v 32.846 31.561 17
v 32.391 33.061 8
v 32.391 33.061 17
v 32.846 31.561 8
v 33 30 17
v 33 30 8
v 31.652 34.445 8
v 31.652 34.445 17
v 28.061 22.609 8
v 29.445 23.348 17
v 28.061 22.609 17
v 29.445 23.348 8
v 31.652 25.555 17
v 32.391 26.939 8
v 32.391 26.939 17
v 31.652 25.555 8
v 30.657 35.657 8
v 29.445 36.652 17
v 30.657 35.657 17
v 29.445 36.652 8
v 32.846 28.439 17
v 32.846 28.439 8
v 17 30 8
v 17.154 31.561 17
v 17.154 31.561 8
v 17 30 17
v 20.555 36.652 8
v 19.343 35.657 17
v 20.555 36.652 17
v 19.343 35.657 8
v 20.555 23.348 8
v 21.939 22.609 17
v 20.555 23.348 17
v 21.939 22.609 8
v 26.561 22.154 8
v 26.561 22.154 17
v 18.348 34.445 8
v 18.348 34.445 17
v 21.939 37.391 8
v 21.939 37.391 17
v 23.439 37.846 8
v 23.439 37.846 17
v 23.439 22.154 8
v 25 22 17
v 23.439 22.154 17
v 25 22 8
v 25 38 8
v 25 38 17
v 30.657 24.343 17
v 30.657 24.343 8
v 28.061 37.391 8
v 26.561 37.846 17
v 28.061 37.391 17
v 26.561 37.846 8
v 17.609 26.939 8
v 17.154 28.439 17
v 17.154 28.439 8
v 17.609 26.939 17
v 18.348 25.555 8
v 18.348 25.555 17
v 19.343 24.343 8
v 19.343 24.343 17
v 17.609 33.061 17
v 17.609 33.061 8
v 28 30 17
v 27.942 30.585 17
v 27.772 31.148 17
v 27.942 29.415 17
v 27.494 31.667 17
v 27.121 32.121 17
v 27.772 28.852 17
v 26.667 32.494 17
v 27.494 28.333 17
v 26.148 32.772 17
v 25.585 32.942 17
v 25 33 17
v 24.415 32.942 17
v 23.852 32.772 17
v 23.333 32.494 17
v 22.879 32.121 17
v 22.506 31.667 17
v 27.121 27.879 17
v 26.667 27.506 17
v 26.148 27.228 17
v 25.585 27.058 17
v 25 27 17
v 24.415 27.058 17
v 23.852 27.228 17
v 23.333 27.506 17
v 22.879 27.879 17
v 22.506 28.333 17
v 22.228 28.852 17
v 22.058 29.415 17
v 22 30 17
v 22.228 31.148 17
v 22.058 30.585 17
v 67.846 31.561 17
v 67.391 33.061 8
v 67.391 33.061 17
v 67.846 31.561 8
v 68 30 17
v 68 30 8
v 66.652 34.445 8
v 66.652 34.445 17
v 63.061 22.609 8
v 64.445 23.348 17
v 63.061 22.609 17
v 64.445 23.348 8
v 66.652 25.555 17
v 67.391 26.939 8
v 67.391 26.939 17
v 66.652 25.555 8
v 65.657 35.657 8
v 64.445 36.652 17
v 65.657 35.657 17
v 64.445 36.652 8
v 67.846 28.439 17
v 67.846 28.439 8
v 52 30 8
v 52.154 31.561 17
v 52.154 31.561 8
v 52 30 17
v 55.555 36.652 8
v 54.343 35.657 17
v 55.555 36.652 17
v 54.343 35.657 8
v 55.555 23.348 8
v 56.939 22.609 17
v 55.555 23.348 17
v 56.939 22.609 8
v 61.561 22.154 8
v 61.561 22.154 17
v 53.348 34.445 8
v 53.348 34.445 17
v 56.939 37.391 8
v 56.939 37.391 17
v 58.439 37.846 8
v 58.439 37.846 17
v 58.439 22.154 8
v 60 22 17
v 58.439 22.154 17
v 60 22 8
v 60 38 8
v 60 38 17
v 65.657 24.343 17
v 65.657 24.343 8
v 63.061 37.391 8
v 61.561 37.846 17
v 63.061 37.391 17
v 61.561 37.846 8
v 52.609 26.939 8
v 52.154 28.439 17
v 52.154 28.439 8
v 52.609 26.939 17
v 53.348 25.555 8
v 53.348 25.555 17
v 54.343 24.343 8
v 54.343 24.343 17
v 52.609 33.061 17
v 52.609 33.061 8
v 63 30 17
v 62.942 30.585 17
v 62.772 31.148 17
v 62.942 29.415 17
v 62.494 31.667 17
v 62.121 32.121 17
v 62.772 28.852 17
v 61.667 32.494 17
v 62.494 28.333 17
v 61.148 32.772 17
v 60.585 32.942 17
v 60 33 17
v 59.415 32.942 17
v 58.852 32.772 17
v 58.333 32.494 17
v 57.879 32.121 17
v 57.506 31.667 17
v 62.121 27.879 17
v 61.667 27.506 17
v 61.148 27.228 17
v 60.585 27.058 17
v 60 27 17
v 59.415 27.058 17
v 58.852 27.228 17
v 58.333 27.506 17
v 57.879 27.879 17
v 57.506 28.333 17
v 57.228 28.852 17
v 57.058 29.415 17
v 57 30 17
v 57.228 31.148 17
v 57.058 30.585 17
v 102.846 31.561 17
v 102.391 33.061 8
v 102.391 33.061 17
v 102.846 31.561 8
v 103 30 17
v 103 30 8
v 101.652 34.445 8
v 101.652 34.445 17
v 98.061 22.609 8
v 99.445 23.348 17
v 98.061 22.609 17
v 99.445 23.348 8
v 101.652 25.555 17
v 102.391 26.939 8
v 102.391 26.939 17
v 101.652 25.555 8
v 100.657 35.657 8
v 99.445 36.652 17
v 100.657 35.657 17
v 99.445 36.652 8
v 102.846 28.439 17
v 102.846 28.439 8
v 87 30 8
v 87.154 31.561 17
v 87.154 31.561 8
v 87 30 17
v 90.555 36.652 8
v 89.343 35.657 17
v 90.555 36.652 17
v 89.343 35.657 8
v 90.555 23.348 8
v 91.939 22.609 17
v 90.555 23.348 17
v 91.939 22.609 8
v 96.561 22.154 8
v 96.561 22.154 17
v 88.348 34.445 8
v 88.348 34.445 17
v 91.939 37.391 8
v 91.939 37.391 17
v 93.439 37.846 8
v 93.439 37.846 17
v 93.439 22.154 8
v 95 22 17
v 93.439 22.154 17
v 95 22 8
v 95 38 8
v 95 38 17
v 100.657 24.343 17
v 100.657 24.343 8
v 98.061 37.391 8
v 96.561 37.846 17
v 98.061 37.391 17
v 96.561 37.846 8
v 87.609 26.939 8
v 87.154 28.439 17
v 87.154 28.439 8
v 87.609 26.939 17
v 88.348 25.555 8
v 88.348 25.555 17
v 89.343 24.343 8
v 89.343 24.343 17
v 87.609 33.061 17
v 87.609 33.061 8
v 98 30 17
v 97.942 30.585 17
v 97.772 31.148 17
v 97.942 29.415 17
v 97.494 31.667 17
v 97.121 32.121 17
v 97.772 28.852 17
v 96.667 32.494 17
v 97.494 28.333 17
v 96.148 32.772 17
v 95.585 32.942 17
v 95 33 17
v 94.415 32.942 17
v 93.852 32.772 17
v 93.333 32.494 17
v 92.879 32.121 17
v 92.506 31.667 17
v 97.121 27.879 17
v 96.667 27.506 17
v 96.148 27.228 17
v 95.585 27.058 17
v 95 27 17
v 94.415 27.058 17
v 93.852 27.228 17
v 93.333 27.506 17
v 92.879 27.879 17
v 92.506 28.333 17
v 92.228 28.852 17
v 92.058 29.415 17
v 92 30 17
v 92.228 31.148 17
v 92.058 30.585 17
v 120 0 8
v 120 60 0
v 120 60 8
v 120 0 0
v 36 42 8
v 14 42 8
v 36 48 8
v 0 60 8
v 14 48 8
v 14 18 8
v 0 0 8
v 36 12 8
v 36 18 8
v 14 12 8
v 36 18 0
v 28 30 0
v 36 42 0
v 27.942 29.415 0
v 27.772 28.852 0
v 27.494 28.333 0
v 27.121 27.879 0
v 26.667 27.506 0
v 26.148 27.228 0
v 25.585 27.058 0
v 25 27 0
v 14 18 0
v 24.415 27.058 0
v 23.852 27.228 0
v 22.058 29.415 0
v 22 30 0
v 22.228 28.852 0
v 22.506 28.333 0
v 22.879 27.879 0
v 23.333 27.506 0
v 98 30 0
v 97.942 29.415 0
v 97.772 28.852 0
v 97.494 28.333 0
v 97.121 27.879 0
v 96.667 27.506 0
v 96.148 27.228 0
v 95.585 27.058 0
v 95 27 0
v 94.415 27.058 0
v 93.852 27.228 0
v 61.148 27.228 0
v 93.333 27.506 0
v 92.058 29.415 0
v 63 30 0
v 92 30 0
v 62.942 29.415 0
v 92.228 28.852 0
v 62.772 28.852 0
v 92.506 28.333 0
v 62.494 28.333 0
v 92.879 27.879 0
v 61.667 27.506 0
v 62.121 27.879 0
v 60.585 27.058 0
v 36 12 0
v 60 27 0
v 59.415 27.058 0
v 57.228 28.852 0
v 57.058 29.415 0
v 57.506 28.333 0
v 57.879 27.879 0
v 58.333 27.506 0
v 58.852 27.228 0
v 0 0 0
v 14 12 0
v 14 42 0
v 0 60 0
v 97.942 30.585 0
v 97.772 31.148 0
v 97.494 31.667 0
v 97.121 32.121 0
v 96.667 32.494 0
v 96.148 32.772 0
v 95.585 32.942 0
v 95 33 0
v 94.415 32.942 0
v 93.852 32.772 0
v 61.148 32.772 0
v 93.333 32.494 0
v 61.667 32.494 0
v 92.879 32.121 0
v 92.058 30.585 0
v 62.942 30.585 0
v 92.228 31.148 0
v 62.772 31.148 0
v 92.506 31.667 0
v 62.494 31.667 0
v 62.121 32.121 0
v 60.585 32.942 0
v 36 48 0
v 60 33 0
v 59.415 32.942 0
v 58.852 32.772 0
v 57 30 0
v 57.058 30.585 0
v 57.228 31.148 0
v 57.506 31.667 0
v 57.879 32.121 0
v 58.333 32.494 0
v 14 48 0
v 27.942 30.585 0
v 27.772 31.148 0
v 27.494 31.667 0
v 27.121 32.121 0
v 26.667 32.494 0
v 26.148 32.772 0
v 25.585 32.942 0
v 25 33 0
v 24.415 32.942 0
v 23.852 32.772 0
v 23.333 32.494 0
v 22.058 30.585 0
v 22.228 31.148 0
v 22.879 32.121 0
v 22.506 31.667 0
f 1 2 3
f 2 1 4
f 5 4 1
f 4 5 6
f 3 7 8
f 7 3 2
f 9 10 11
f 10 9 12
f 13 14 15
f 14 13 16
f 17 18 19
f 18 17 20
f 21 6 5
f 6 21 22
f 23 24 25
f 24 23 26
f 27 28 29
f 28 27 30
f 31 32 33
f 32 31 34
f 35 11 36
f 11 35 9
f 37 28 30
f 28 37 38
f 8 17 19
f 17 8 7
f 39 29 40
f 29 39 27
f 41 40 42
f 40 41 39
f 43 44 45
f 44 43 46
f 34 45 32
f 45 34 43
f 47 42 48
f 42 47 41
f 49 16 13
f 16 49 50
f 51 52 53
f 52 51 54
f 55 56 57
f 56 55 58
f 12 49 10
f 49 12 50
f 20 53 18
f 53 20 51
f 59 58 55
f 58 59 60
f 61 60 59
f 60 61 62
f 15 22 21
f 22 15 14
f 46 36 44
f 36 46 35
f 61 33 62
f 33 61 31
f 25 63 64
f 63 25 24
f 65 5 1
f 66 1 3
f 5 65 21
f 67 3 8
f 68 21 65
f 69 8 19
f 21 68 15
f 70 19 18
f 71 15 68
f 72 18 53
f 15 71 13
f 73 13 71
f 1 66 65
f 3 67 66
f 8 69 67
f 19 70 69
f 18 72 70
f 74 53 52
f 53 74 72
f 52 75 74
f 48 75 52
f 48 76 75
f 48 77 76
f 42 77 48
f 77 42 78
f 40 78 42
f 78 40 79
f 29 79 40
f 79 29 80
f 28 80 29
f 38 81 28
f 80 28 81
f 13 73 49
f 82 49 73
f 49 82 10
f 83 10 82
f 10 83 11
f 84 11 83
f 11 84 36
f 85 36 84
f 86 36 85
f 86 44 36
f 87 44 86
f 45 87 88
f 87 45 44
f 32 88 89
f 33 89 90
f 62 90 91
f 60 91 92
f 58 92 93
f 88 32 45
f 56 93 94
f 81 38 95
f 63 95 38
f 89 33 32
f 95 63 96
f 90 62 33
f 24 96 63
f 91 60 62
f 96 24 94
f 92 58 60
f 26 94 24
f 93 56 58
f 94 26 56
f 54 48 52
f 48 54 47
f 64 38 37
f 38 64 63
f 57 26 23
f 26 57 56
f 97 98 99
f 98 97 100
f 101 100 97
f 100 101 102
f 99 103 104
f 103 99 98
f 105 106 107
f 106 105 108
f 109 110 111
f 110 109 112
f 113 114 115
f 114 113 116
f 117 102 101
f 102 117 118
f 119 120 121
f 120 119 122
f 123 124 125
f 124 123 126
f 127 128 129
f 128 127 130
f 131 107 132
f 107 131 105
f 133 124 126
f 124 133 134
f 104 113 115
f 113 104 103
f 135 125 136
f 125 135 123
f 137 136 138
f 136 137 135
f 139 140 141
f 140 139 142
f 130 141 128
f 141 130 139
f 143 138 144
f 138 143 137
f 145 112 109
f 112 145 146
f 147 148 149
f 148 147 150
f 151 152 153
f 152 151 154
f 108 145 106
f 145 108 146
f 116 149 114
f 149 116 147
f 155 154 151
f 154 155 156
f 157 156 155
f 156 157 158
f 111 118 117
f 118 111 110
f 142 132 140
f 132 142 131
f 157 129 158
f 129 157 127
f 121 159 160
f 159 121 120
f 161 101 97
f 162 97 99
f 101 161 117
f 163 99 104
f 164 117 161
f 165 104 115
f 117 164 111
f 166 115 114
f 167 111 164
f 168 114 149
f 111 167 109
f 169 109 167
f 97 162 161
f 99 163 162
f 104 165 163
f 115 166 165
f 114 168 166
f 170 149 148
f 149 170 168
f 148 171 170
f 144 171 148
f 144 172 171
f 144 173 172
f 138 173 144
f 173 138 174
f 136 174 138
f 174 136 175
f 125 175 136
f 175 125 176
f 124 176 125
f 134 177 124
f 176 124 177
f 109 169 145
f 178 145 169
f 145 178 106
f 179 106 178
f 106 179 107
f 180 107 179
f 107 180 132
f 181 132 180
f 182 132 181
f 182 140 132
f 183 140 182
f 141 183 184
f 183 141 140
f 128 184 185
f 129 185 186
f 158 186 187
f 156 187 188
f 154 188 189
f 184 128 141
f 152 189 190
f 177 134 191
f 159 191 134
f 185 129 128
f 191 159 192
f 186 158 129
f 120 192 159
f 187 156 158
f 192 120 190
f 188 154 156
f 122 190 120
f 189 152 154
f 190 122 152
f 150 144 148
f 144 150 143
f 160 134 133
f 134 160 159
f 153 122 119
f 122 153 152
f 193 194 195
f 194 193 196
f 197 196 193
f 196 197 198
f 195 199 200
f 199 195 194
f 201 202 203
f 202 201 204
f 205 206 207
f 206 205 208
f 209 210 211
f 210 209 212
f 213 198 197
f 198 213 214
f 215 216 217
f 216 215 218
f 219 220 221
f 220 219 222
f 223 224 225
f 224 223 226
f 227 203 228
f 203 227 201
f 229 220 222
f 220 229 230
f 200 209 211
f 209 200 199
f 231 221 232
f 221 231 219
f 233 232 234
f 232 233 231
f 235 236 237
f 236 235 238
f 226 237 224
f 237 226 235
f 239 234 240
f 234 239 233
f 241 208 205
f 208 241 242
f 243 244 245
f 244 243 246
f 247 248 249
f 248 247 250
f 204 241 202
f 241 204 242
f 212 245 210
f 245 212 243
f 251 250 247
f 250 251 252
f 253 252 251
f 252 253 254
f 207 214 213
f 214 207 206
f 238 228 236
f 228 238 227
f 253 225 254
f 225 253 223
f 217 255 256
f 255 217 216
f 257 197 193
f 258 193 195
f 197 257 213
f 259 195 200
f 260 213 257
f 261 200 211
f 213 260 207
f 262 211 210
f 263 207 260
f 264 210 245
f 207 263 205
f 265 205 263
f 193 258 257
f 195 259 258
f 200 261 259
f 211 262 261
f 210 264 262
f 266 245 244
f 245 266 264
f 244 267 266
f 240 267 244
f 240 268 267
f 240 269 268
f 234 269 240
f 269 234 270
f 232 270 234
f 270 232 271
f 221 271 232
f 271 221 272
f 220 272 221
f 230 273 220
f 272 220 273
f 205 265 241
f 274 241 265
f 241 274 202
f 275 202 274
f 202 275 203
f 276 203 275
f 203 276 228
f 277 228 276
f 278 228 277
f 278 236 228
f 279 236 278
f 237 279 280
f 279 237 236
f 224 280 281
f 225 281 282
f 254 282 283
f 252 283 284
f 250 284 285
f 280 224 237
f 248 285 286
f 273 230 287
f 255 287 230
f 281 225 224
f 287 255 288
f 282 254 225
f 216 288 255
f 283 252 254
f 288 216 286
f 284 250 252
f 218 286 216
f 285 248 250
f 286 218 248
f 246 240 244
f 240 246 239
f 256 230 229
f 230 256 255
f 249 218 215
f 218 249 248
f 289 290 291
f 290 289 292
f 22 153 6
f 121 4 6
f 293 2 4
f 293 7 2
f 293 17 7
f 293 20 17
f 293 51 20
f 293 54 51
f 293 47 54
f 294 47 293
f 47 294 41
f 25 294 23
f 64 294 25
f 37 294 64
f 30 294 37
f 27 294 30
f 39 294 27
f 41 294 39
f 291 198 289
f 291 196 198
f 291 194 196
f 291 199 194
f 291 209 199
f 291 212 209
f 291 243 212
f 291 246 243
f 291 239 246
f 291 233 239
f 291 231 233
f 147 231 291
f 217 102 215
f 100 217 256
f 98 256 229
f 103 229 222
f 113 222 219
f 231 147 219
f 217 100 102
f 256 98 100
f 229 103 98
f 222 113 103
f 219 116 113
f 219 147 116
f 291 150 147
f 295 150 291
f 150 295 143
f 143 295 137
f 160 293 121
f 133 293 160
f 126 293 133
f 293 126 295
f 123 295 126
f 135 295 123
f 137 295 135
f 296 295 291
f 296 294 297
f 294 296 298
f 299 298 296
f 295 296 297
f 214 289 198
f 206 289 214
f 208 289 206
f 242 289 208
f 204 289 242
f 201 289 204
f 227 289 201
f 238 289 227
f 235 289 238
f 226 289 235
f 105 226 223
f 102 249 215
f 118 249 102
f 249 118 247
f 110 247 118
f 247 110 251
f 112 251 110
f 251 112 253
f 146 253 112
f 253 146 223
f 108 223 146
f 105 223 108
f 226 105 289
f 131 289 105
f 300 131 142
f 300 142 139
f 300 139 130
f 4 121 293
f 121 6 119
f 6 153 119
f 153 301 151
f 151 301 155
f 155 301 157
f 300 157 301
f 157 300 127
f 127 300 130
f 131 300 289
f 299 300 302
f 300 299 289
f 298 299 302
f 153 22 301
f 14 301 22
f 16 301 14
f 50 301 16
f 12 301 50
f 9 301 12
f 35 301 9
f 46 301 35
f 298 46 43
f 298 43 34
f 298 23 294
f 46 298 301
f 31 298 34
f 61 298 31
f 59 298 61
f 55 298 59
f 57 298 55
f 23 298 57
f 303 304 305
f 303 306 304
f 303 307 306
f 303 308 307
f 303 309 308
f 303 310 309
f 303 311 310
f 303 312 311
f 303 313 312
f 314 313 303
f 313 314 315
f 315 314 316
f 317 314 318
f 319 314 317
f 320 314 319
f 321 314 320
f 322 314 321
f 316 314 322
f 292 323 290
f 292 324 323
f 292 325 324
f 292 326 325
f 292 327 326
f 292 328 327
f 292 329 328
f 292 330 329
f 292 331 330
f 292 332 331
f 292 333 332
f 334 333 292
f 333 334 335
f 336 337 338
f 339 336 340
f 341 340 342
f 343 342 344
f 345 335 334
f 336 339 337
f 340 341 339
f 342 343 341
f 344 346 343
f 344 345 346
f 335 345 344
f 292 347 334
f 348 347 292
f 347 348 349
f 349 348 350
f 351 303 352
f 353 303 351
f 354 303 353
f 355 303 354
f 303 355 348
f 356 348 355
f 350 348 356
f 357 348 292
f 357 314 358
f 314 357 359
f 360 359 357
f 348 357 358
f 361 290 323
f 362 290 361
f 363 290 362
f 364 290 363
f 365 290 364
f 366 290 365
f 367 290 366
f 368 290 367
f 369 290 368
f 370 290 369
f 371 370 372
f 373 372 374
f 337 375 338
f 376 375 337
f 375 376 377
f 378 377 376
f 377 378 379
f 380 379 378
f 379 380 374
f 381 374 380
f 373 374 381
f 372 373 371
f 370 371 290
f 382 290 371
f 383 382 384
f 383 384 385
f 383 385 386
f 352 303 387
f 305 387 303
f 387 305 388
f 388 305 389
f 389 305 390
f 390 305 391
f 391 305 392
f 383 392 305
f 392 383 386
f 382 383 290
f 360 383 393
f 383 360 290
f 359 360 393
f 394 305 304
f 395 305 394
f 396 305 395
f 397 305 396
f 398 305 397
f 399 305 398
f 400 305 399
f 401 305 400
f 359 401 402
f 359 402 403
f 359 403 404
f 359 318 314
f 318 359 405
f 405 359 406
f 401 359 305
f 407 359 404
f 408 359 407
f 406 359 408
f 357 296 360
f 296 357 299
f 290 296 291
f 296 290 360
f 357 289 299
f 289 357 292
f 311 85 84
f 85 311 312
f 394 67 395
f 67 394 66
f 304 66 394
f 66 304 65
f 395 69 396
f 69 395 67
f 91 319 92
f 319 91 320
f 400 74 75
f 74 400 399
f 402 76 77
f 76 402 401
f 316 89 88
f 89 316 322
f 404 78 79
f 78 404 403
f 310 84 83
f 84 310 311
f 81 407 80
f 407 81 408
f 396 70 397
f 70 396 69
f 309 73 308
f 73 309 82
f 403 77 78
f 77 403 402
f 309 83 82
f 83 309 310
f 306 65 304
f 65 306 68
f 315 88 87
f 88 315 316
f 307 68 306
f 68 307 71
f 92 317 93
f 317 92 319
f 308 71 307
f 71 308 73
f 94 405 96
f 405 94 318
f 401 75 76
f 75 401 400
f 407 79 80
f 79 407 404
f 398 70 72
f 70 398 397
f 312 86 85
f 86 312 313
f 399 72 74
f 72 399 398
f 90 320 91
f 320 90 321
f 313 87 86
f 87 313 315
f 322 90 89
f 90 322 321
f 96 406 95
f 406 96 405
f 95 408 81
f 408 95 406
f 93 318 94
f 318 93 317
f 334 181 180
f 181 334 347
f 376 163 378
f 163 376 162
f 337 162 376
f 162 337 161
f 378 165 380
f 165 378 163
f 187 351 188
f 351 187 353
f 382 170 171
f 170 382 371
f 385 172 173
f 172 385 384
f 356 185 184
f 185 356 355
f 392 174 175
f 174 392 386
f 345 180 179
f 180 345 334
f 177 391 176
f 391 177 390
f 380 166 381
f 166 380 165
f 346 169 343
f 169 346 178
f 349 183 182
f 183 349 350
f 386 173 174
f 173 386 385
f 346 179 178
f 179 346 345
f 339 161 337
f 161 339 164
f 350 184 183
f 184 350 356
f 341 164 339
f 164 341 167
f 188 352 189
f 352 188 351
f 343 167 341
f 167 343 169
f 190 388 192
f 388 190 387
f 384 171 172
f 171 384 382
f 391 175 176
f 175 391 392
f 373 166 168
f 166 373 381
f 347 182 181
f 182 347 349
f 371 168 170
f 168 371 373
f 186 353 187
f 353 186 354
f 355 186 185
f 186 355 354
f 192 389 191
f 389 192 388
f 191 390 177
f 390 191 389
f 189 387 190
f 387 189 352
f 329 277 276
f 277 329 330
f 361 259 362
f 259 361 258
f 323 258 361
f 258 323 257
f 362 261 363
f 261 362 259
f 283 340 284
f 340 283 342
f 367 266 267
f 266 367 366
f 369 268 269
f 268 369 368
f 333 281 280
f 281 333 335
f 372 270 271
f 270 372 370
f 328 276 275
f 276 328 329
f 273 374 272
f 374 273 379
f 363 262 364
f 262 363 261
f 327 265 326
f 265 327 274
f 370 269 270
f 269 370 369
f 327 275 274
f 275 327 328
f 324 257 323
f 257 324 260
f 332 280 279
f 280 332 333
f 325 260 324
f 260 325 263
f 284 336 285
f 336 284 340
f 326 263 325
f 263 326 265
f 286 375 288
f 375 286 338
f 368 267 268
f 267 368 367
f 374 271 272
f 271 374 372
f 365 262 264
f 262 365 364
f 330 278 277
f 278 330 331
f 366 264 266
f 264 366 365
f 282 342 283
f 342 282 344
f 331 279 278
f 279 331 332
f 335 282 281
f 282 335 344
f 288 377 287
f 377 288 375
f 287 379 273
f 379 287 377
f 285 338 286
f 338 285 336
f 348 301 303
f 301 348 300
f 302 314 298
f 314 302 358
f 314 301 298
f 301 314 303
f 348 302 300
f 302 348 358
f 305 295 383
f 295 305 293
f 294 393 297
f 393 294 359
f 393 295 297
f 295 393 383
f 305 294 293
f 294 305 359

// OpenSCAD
$fn = 32;

// ----------------------------------------------------------------------
// Drill jig: three_boss_slot jig
// ----------------------------------------------------------------------

// --- parameters (mm) ---
plate_l = 120;            // plate length, X
plate_w = 60;             // plate width, Y
plate_t = 8;              // plate thickness
boss_d = 16;              // guide boss diameter
boss_h = 10;              // boss height above the plate
guide_d = 6;              // guide hole diameter
boss_pitch = 35;          // boss pitch
slot_w = 6;               // clamp slot width
slot_l = 22;              // clamp slot length
slot_x = 14;              // slot start X

n_boss = 3;  // guide bosses
boss_x0 = (plate_l - (n_boss - 1) * boss_pitch) / 2;  // first boss X
boss_top = plate_t - 1 + boss_h;  // boss crown height
total_h = boss_top;  // overall height

difference() {
  union() {
  cube([plate_l, plate_w, plate_t]);
  for (i = [0 : n_boss - 1])
    translate([boss_x0 + i * boss_pitch, plate_w / 2, plate_t - 1])
      cylinder(h = boss_h, d = boss_d);
  }
  for (i = [0 : n_boss - 1])
    translate([boss_x0 + i * boss_pitch, plate_w / 2, -1])
      cylinder(h = plate_t + boss_h, d = guide_d);
  for (cy = [plate_w * 0.25, plate_w * 0.75])
    translate([slot_x, cy - slot_w / 2, -1])
      cube([slot_l, slot_w, plate_t + 2]);
}
